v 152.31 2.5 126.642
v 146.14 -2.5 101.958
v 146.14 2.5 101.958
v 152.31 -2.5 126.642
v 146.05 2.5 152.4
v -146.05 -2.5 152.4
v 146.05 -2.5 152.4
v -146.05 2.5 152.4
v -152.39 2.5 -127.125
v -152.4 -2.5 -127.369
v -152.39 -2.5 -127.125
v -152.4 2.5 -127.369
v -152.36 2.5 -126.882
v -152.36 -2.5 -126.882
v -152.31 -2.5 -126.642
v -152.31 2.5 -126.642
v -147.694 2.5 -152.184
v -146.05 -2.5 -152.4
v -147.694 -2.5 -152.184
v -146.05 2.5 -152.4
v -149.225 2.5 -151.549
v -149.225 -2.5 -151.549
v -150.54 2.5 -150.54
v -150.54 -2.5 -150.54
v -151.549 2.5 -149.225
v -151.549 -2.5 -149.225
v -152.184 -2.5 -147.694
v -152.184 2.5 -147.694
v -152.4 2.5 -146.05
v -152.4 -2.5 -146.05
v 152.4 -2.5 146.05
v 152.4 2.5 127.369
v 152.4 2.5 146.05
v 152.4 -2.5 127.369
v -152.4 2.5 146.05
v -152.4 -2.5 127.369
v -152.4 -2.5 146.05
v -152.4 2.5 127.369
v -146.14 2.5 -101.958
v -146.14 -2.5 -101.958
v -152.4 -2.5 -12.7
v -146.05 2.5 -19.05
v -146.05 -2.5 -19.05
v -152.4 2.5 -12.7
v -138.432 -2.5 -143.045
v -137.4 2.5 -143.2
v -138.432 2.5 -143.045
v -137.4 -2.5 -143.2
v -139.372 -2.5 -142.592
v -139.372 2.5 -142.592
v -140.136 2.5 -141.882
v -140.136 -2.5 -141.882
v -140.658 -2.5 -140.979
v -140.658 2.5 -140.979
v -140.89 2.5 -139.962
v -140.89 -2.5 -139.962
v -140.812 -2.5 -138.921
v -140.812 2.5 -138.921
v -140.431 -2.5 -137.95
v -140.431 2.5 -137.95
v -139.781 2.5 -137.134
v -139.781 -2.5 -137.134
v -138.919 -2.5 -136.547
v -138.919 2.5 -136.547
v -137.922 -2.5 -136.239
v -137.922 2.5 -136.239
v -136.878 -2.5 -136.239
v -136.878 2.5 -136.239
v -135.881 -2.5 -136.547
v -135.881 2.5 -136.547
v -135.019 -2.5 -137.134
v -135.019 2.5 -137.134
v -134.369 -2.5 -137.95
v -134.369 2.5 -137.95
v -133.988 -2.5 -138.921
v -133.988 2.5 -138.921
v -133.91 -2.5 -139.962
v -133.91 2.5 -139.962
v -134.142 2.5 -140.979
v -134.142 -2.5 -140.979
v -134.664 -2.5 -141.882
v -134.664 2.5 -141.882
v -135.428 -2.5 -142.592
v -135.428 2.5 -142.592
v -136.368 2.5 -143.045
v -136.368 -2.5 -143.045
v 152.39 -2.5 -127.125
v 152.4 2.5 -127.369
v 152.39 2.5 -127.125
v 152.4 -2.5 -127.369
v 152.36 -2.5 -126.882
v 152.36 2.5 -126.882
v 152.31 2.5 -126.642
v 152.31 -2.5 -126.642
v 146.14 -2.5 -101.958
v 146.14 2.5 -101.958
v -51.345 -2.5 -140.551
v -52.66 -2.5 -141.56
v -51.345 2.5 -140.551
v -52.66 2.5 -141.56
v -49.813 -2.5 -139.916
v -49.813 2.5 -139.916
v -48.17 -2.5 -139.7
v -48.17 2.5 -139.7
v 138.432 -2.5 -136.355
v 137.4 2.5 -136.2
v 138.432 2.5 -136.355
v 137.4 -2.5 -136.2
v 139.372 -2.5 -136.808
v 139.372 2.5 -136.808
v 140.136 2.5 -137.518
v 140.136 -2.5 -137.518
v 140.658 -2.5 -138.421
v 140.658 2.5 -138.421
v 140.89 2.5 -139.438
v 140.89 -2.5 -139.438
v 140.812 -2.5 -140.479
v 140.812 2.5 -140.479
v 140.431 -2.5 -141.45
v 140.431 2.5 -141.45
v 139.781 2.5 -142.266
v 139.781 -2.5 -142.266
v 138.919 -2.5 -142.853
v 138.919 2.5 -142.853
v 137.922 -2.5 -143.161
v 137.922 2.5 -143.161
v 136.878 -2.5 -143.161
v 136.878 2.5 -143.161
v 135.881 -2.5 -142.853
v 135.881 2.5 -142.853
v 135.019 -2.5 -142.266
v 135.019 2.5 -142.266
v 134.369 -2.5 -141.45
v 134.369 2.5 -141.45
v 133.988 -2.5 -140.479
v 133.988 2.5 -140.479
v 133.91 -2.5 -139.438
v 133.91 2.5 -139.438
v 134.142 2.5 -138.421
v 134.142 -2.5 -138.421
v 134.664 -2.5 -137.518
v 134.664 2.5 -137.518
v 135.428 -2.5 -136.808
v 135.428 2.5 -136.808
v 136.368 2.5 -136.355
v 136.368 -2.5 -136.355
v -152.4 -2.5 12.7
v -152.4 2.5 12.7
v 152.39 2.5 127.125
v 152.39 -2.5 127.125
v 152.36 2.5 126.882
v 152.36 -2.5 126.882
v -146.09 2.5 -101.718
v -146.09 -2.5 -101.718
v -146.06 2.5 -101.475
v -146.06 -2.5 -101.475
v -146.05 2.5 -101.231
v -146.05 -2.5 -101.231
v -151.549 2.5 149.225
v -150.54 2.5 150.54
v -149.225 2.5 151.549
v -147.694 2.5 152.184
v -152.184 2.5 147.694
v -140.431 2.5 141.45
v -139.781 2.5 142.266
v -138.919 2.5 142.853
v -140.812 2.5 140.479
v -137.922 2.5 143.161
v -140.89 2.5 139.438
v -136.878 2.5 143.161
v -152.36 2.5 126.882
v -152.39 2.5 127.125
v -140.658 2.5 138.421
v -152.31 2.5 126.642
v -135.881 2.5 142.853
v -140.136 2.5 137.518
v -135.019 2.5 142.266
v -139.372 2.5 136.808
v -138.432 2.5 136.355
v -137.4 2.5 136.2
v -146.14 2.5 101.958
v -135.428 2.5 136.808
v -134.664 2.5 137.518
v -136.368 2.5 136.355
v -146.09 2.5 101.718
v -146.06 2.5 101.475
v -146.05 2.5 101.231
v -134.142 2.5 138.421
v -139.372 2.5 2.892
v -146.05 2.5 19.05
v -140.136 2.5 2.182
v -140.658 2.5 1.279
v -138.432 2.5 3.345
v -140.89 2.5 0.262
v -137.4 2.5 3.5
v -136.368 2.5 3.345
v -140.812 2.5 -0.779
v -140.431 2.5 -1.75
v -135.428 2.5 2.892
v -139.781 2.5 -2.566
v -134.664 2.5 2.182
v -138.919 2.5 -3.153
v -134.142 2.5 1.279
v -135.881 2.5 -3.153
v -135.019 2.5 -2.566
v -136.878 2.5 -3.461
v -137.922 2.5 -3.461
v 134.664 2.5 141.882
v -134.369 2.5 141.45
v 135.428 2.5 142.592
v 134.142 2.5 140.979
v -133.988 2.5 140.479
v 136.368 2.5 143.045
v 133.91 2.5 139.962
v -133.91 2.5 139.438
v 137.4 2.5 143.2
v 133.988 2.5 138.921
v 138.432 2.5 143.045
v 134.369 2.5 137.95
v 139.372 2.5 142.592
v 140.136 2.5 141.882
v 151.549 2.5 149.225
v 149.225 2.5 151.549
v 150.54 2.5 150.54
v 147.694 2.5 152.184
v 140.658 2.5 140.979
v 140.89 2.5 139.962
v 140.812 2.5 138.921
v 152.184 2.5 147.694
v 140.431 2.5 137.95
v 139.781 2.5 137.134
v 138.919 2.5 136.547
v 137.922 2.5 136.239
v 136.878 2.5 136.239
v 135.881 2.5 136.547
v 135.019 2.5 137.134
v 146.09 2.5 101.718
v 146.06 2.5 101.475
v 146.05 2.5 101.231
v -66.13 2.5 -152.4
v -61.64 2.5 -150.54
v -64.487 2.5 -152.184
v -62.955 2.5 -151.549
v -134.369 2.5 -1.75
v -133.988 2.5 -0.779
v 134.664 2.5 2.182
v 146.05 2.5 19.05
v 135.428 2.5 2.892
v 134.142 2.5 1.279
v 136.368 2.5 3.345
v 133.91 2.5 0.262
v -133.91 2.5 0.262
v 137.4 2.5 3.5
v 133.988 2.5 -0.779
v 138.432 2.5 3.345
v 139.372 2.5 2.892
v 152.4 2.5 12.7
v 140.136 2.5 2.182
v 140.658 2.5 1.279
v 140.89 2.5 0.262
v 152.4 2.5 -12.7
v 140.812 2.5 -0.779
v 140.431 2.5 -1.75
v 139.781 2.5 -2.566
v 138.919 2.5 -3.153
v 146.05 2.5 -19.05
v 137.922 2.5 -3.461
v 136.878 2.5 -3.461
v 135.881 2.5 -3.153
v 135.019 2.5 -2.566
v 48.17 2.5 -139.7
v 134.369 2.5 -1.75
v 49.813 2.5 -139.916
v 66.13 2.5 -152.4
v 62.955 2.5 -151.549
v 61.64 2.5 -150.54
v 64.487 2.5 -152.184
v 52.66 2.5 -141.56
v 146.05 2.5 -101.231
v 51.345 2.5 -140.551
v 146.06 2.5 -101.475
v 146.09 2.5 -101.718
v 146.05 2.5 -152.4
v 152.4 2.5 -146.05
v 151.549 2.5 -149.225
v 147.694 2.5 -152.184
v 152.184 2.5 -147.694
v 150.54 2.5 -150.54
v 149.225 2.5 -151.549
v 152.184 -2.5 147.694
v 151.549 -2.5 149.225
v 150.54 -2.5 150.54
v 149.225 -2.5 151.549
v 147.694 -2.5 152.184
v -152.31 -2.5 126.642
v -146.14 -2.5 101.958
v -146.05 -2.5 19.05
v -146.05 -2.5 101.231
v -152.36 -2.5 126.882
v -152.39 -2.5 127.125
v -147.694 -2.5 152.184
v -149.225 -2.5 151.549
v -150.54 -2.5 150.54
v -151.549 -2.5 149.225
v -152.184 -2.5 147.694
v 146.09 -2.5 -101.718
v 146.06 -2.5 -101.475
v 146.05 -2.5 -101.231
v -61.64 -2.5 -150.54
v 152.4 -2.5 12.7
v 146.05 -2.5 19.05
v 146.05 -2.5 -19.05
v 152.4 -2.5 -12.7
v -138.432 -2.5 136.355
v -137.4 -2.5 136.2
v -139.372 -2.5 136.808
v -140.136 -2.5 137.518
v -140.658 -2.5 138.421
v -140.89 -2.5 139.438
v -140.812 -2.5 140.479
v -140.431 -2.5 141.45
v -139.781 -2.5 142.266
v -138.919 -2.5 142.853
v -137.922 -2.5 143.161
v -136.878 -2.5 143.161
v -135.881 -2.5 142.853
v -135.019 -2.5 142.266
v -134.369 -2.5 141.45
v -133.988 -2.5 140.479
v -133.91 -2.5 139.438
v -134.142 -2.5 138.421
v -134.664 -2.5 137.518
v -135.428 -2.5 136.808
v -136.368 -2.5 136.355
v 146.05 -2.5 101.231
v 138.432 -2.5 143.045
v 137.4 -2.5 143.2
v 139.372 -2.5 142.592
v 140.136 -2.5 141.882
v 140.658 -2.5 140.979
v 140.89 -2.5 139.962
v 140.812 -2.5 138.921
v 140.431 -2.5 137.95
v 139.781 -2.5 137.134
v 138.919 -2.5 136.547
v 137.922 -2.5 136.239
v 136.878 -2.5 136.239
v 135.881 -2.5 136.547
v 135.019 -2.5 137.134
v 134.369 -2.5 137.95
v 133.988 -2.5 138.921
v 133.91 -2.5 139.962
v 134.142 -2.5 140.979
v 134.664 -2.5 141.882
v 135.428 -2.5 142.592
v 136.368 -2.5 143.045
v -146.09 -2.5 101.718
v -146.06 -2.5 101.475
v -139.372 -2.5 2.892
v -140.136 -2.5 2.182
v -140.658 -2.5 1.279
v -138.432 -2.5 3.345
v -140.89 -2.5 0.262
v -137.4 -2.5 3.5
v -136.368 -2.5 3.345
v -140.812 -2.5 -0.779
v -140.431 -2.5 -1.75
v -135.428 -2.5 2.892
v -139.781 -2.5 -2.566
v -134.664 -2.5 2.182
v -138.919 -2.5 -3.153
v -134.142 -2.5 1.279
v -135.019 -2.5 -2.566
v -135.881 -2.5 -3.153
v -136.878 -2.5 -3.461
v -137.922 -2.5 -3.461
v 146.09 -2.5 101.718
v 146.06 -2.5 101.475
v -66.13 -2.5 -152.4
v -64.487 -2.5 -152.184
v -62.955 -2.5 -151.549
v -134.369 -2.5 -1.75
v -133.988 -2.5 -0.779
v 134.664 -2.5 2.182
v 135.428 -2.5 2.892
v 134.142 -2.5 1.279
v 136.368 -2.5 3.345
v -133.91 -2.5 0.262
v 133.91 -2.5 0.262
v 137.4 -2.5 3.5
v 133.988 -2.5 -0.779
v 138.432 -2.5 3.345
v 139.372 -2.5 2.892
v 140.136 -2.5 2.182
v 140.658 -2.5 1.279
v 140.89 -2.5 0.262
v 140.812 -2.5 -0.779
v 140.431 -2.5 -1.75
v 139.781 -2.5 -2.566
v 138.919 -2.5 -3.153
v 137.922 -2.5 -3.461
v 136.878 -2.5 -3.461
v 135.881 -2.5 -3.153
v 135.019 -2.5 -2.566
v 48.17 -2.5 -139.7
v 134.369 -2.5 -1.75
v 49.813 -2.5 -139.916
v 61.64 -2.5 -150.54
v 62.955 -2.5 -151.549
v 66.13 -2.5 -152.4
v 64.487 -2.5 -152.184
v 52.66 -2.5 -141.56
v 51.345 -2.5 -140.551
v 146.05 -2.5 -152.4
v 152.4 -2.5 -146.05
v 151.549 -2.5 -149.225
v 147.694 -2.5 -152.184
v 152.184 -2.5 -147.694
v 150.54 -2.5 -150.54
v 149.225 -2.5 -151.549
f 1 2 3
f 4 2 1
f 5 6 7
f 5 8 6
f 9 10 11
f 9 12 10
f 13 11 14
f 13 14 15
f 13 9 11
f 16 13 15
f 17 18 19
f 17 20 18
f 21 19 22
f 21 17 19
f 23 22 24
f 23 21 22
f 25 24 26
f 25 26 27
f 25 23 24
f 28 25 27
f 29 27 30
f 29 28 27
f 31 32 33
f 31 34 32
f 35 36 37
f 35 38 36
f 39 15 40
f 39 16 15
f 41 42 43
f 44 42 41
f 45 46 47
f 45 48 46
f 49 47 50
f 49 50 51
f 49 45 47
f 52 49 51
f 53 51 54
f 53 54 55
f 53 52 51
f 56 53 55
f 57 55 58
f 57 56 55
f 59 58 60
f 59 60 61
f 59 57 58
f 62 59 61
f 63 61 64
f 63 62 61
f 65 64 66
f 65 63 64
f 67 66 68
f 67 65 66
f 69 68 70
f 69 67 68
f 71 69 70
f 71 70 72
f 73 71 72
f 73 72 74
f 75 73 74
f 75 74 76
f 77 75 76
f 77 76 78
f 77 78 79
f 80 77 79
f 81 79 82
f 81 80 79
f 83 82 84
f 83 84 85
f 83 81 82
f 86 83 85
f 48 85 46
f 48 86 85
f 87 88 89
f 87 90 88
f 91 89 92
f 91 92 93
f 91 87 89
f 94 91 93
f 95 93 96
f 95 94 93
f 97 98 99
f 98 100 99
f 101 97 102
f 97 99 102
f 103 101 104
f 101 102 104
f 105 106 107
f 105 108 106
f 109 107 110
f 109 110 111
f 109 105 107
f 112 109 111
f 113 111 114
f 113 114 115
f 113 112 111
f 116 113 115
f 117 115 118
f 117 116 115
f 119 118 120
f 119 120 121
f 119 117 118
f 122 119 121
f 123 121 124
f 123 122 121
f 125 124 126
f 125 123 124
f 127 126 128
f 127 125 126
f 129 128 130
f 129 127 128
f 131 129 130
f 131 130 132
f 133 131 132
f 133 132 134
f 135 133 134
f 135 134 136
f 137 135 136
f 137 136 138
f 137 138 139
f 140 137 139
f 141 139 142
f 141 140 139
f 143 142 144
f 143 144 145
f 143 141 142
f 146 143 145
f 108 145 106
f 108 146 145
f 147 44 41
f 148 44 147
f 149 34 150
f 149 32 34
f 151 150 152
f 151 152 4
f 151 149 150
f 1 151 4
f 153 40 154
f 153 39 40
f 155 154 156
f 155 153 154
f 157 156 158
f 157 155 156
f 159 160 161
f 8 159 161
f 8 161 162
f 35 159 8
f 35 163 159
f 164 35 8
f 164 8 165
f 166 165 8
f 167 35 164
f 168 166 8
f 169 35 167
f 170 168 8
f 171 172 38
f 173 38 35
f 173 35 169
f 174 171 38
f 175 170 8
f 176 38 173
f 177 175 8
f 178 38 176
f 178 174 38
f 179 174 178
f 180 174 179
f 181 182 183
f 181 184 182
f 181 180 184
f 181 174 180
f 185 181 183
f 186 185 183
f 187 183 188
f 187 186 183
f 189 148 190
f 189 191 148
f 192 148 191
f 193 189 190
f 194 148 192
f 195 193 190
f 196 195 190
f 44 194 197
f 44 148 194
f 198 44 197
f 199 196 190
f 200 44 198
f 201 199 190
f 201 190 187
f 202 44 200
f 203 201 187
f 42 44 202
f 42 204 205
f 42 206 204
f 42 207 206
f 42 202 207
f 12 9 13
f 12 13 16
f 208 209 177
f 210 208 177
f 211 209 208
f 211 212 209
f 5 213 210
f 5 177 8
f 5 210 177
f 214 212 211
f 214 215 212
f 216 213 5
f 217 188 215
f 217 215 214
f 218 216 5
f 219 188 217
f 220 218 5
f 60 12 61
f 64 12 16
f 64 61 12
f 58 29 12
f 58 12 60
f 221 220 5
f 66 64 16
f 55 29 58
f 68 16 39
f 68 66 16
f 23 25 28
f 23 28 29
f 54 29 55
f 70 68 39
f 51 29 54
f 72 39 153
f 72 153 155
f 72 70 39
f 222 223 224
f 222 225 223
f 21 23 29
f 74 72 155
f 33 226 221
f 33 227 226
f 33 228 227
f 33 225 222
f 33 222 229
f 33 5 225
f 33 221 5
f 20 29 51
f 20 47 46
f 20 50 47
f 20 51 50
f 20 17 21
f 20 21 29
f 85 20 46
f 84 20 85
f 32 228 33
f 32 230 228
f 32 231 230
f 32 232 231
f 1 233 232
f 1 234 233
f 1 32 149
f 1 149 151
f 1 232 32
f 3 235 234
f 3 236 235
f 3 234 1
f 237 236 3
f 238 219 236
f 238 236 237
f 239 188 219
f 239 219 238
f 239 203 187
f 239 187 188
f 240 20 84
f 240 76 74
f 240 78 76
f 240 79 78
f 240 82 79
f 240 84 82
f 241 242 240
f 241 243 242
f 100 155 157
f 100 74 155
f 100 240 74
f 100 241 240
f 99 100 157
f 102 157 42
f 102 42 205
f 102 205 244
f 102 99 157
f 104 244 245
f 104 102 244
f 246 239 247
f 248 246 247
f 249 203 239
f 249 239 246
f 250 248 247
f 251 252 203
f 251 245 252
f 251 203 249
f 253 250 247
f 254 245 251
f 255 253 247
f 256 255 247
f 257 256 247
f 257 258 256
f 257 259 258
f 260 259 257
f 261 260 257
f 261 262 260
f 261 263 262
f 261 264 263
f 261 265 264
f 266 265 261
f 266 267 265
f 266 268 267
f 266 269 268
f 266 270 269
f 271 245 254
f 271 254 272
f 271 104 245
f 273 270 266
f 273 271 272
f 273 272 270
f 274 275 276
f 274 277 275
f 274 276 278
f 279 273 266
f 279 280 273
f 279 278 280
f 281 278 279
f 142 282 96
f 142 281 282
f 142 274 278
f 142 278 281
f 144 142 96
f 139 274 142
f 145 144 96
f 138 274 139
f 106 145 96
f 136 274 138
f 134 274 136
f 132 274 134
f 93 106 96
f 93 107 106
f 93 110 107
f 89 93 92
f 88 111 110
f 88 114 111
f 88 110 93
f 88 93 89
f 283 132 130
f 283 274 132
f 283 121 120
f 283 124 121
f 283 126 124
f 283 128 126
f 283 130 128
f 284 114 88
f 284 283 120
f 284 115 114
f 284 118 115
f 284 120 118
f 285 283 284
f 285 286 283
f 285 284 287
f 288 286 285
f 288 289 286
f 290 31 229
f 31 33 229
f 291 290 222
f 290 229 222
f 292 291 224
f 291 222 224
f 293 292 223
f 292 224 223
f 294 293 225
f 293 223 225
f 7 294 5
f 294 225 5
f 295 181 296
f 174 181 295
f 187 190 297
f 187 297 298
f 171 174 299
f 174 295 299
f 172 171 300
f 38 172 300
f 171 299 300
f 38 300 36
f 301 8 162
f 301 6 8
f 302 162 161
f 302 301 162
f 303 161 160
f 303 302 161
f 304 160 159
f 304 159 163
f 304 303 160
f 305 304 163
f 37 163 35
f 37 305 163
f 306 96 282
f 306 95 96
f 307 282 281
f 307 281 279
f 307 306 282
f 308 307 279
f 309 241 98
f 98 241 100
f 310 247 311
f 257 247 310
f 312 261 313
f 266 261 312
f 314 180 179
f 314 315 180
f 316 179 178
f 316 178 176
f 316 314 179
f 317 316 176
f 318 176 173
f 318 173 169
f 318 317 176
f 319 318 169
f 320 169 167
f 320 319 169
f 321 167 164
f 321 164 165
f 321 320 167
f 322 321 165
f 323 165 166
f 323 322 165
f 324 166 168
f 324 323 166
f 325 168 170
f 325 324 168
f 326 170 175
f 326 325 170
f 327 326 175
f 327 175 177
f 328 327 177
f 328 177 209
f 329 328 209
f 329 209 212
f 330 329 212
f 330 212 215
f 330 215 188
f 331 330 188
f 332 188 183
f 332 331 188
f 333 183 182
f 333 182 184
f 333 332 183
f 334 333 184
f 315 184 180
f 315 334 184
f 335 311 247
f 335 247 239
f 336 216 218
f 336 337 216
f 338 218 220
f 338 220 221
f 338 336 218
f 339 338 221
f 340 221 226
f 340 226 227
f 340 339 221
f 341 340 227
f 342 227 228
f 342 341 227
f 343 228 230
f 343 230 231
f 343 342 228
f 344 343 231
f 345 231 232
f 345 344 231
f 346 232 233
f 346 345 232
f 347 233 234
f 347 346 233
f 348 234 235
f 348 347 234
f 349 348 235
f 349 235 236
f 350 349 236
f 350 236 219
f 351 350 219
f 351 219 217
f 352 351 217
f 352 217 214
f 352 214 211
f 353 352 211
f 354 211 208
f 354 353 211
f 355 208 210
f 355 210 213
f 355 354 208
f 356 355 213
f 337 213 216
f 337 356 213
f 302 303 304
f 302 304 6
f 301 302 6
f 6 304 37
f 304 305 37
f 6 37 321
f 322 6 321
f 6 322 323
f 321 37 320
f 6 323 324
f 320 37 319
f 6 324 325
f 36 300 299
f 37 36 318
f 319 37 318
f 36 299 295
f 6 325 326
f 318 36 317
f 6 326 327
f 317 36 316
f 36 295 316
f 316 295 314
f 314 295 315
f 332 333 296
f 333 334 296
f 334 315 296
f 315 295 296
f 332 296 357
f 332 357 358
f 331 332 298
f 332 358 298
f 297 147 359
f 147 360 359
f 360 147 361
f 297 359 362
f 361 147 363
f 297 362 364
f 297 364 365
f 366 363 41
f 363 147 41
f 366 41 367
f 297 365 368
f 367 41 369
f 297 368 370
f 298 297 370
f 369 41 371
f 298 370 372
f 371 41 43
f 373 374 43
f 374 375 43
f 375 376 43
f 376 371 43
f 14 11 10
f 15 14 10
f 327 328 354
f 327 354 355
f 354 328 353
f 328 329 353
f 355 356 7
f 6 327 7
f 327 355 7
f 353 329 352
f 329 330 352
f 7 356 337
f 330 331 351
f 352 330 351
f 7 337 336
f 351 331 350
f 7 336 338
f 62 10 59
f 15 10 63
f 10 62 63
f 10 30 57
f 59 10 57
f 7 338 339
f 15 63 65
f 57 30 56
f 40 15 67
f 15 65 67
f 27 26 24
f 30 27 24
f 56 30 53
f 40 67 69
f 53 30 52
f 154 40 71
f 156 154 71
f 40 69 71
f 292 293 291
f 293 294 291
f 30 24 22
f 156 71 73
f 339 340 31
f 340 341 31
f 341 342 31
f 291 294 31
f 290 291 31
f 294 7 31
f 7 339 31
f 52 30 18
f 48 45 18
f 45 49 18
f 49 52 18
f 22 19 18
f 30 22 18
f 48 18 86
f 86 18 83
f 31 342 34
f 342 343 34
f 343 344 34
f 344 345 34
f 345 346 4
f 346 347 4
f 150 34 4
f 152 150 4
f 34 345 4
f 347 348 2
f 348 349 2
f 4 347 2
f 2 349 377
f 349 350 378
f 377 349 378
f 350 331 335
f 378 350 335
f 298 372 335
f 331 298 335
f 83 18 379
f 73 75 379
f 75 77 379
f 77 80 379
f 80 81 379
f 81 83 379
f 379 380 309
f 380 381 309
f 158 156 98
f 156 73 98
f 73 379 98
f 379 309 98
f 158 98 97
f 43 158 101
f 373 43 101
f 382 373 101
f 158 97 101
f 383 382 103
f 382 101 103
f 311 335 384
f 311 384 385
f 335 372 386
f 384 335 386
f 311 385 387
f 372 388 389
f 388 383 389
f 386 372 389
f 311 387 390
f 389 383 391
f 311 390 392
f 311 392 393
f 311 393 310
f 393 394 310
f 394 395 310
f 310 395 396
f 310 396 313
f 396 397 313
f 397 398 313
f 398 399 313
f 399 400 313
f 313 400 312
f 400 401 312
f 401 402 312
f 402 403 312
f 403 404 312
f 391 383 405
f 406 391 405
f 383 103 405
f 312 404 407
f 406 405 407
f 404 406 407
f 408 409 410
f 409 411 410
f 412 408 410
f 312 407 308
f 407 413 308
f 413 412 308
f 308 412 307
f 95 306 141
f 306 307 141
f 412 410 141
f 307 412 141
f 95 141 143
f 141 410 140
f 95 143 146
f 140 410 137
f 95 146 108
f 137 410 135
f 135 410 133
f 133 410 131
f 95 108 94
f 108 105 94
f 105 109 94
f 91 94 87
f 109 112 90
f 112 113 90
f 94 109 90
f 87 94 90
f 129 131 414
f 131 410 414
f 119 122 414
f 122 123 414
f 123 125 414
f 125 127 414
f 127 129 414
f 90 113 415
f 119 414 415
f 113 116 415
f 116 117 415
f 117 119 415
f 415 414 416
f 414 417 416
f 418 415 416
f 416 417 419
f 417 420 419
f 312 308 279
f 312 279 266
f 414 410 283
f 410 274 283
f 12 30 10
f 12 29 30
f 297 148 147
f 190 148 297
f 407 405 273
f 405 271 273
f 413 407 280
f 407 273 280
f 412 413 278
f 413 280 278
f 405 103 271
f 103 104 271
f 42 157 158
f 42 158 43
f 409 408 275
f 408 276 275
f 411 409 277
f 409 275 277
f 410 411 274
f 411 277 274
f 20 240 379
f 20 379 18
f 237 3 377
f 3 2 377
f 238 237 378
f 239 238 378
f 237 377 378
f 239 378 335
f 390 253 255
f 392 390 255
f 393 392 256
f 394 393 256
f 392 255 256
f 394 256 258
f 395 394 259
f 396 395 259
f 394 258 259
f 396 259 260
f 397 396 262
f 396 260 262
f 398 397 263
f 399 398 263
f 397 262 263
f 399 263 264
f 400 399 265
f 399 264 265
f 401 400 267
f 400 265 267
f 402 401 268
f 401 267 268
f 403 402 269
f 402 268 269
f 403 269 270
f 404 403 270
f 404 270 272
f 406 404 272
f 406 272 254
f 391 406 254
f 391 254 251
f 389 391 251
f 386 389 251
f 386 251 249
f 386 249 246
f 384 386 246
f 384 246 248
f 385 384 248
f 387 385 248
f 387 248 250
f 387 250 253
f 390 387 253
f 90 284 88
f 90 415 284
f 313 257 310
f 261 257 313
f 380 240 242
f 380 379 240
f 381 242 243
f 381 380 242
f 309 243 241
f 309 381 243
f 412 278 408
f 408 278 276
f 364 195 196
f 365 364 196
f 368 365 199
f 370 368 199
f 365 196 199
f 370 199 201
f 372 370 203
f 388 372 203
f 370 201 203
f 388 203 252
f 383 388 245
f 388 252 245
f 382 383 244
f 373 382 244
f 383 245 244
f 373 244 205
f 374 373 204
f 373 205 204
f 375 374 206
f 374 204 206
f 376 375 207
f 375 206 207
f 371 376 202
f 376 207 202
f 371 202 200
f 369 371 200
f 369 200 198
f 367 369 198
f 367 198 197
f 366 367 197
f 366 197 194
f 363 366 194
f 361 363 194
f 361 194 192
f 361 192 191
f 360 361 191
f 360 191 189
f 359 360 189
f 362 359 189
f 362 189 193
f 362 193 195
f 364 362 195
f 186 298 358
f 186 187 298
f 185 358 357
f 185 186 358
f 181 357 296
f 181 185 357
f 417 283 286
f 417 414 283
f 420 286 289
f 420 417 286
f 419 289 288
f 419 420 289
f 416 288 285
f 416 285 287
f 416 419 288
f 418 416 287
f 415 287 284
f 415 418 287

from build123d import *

# Parameters (mm, degrees)
BOSS_EXTRUDE1_DEPTH = 2.5
SKETCH2_R           = 3.5
BOSS_EXTRUDE2_DEPTH = 2.5
FILLET1_R           = 6.35
FILLET2_R           = 6.35
FILLET3_R           = 3
BOSS_EXTRUDE3_DEPTH = 5
CUT_EXTRUDE1_REACH  = 217.584
SKETCH3_4_R         = 3.5


with BuildPart() as part:
    # Sketch1 → Boss-Extrude1 (new, symmetric)
    with BuildSketch(Plane(origin=(0, 0, 0), x_dir=(1, 0, 0), z_dir=(0, 1, 0))):
        Polygon((63.5, 152.4), (127, 152.4), (127, -152.4), (-127, -152.4), (-127, 152.4), (-63.5, 152.4), (-50.8, 139.7), (50.8, 139.7), align=None)
    extrude(amount=BOSS_EXTRUDE1_DEPTH, both=True)

    # Sketch2 → Boss-Extrude2 (add, symmetric)
    # profile 1 of 2: a face of its own
    with BuildSketch(Plane(origin=(0, 0, 0), x_dir=(1, 0, 0), z_dir=(0, 1, 0))):
        Polygon((127, 152.4), (152.4, 152.4), (152.4, 127), (146.05, 101.6), (146.05, -101.6), (152.4, -127), (152.4, -152.4), (127, -152.4), align=None)
        with Locations(Location((137.4, 139.7, 0), (0, 0, 270))):
            Circle(SKETCH2_R, mode=Mode.SUBTRACT)
        with Locations(Location((137.4, -139.7, 0), (0, 0, 270))):
            Circle(SKETCH2_R, mode=Mode.SUBTRACT)
    # profile 2 of 2: a face of its own
    with BuildSketch(Plane(origin=(0, 0, 0), x_dir=(1, 0, 0), z_dir=(0, 1, 0))):
        Polygon((-127, 152.4), (-152.4, 152.4), (-152.4, 127), (-146.05, 101.6), (-146.05, -101.6), (-152.4, -127), (-152.4, -152.4), (-127, -152.4), align=None)
        with Locations(Location((-137.4, -139.7, 0), (0, 0, 90))):
            Circle(SKETCH2_R, mode=Mode.SUBTRACT)
        with Locations(Location((-137.4, 139.7, 0), (0, 0, 90))):
            Circle(SKETCH2_R, mode=Mode.SUBTRACT)
    extrude(amount=BOSS_EXTRUDE2_DEPTH, both=True)

    # Fillet1
    fillet1_edges = [part.edges().sort_by_distance(p)[0] for p in [
        (152.4, 0, 152.4),
        (152.4, 0, -152.4),
        (-152.4, 0, -152.4),
        (-152.4, 0, 152.4),
    ]]
    fillet(fillet1_edges, radius=FILLET1_R)

    # Fillet2
    fillet2_edges = [part.edges().sort_by_distance(p)[0] for p in [
        (-63.5, 0, -152.4),
        (-50.8, 0, -139.7),
        (50.8, 0, -139.7),
        (63.5, 0, -152.4),
    ]]
    fillet(fillet2_edges, radius=FILLET2_R)

    # Fillet3
    fillet3_edges = [part.edges().sort_by_distance(p)[0] for p in [
        (152.4, 0, 127),
        (146.05, 0, 101.6),
        (146.05, 0, -101.6),
        (152.4, 0, -127),
        (-152.4, 0, -127),
        (-146.05, 0, -101.6),
        (-146.05, 0, 101.6),
        (-152.4, 0, 127),
    ]]
    fillet(fillet3_edges, radius=FILLET3_R)

    # Sketch3 → Boss-Extrude3 (add)
    with BuildSketch(Plane(origin=(0, 2.5, 0), x_dir=(1, 0, 0), z_dir=(0, 1, 0))):
        Polygon((-146.05, 19.05), (-152.4, 12.7), (-152.4, -12.7), (-146.05, -19.05), align=None)
        Polygon((152.4, -12.7), (152.4, 12.7), (146.05, 19.05), (146.05, -19.05), align=None)
    extrude(amount=-BOSS_EXTRUDE3_DEPTH)

    # Sketch3<4> → Cut-Extrude1 (cut, up to next)
    with BuildSketch(Plane(origin=(0, 2.5, 0), x_dir=(1, 0, 0), z_dir=(0, 1, 0)), mode=Mode.PRIVATE) as cut_extrude1_sk1:
        with Locations(Location((-137.4, 0, 0), (0, 0, 270))):
            Circle(SKETCH3_4_R)
    cut_extrude1_tool1 = extrude(cut_extrude1_sk1.sketch, amount=-CUT_EXTRUDE1_REACH, mode=Mode.PRIVATE) & part.part
    # Sketch3<4> → Cut-Extrude1 (cut, up to next)
    with BuildSketch(Plane(origin=(0, 2.5, 0), x_dir=(1, 0, 0), z_dir=(0, 1, 0)), mode=Mode.PRIVATE) as cut_extrude1_sk2:
        with Locations(Location((137.4, 0, 0), (0, 0, 270))):
            Circle(SKETCH3_4_R)
    cut_extrude1_tool2 = extrude(cut_extrude1_sk2.sketch, amount=-CUT_EXTRUDE1_REACH, mode=Mode.PRIVATE) & part.part
    add(cut_extrude1_tool1.solids().sort_by_distance((-137.4, 2.5, 0))[0], mode=Mode.SUBTRACT)
    add(cut_extrude1_tool2.solids().sort_by_distance((137.4, 2.5, 0))[0], mode=Mode.SUBTRACT)


solid = part.part
